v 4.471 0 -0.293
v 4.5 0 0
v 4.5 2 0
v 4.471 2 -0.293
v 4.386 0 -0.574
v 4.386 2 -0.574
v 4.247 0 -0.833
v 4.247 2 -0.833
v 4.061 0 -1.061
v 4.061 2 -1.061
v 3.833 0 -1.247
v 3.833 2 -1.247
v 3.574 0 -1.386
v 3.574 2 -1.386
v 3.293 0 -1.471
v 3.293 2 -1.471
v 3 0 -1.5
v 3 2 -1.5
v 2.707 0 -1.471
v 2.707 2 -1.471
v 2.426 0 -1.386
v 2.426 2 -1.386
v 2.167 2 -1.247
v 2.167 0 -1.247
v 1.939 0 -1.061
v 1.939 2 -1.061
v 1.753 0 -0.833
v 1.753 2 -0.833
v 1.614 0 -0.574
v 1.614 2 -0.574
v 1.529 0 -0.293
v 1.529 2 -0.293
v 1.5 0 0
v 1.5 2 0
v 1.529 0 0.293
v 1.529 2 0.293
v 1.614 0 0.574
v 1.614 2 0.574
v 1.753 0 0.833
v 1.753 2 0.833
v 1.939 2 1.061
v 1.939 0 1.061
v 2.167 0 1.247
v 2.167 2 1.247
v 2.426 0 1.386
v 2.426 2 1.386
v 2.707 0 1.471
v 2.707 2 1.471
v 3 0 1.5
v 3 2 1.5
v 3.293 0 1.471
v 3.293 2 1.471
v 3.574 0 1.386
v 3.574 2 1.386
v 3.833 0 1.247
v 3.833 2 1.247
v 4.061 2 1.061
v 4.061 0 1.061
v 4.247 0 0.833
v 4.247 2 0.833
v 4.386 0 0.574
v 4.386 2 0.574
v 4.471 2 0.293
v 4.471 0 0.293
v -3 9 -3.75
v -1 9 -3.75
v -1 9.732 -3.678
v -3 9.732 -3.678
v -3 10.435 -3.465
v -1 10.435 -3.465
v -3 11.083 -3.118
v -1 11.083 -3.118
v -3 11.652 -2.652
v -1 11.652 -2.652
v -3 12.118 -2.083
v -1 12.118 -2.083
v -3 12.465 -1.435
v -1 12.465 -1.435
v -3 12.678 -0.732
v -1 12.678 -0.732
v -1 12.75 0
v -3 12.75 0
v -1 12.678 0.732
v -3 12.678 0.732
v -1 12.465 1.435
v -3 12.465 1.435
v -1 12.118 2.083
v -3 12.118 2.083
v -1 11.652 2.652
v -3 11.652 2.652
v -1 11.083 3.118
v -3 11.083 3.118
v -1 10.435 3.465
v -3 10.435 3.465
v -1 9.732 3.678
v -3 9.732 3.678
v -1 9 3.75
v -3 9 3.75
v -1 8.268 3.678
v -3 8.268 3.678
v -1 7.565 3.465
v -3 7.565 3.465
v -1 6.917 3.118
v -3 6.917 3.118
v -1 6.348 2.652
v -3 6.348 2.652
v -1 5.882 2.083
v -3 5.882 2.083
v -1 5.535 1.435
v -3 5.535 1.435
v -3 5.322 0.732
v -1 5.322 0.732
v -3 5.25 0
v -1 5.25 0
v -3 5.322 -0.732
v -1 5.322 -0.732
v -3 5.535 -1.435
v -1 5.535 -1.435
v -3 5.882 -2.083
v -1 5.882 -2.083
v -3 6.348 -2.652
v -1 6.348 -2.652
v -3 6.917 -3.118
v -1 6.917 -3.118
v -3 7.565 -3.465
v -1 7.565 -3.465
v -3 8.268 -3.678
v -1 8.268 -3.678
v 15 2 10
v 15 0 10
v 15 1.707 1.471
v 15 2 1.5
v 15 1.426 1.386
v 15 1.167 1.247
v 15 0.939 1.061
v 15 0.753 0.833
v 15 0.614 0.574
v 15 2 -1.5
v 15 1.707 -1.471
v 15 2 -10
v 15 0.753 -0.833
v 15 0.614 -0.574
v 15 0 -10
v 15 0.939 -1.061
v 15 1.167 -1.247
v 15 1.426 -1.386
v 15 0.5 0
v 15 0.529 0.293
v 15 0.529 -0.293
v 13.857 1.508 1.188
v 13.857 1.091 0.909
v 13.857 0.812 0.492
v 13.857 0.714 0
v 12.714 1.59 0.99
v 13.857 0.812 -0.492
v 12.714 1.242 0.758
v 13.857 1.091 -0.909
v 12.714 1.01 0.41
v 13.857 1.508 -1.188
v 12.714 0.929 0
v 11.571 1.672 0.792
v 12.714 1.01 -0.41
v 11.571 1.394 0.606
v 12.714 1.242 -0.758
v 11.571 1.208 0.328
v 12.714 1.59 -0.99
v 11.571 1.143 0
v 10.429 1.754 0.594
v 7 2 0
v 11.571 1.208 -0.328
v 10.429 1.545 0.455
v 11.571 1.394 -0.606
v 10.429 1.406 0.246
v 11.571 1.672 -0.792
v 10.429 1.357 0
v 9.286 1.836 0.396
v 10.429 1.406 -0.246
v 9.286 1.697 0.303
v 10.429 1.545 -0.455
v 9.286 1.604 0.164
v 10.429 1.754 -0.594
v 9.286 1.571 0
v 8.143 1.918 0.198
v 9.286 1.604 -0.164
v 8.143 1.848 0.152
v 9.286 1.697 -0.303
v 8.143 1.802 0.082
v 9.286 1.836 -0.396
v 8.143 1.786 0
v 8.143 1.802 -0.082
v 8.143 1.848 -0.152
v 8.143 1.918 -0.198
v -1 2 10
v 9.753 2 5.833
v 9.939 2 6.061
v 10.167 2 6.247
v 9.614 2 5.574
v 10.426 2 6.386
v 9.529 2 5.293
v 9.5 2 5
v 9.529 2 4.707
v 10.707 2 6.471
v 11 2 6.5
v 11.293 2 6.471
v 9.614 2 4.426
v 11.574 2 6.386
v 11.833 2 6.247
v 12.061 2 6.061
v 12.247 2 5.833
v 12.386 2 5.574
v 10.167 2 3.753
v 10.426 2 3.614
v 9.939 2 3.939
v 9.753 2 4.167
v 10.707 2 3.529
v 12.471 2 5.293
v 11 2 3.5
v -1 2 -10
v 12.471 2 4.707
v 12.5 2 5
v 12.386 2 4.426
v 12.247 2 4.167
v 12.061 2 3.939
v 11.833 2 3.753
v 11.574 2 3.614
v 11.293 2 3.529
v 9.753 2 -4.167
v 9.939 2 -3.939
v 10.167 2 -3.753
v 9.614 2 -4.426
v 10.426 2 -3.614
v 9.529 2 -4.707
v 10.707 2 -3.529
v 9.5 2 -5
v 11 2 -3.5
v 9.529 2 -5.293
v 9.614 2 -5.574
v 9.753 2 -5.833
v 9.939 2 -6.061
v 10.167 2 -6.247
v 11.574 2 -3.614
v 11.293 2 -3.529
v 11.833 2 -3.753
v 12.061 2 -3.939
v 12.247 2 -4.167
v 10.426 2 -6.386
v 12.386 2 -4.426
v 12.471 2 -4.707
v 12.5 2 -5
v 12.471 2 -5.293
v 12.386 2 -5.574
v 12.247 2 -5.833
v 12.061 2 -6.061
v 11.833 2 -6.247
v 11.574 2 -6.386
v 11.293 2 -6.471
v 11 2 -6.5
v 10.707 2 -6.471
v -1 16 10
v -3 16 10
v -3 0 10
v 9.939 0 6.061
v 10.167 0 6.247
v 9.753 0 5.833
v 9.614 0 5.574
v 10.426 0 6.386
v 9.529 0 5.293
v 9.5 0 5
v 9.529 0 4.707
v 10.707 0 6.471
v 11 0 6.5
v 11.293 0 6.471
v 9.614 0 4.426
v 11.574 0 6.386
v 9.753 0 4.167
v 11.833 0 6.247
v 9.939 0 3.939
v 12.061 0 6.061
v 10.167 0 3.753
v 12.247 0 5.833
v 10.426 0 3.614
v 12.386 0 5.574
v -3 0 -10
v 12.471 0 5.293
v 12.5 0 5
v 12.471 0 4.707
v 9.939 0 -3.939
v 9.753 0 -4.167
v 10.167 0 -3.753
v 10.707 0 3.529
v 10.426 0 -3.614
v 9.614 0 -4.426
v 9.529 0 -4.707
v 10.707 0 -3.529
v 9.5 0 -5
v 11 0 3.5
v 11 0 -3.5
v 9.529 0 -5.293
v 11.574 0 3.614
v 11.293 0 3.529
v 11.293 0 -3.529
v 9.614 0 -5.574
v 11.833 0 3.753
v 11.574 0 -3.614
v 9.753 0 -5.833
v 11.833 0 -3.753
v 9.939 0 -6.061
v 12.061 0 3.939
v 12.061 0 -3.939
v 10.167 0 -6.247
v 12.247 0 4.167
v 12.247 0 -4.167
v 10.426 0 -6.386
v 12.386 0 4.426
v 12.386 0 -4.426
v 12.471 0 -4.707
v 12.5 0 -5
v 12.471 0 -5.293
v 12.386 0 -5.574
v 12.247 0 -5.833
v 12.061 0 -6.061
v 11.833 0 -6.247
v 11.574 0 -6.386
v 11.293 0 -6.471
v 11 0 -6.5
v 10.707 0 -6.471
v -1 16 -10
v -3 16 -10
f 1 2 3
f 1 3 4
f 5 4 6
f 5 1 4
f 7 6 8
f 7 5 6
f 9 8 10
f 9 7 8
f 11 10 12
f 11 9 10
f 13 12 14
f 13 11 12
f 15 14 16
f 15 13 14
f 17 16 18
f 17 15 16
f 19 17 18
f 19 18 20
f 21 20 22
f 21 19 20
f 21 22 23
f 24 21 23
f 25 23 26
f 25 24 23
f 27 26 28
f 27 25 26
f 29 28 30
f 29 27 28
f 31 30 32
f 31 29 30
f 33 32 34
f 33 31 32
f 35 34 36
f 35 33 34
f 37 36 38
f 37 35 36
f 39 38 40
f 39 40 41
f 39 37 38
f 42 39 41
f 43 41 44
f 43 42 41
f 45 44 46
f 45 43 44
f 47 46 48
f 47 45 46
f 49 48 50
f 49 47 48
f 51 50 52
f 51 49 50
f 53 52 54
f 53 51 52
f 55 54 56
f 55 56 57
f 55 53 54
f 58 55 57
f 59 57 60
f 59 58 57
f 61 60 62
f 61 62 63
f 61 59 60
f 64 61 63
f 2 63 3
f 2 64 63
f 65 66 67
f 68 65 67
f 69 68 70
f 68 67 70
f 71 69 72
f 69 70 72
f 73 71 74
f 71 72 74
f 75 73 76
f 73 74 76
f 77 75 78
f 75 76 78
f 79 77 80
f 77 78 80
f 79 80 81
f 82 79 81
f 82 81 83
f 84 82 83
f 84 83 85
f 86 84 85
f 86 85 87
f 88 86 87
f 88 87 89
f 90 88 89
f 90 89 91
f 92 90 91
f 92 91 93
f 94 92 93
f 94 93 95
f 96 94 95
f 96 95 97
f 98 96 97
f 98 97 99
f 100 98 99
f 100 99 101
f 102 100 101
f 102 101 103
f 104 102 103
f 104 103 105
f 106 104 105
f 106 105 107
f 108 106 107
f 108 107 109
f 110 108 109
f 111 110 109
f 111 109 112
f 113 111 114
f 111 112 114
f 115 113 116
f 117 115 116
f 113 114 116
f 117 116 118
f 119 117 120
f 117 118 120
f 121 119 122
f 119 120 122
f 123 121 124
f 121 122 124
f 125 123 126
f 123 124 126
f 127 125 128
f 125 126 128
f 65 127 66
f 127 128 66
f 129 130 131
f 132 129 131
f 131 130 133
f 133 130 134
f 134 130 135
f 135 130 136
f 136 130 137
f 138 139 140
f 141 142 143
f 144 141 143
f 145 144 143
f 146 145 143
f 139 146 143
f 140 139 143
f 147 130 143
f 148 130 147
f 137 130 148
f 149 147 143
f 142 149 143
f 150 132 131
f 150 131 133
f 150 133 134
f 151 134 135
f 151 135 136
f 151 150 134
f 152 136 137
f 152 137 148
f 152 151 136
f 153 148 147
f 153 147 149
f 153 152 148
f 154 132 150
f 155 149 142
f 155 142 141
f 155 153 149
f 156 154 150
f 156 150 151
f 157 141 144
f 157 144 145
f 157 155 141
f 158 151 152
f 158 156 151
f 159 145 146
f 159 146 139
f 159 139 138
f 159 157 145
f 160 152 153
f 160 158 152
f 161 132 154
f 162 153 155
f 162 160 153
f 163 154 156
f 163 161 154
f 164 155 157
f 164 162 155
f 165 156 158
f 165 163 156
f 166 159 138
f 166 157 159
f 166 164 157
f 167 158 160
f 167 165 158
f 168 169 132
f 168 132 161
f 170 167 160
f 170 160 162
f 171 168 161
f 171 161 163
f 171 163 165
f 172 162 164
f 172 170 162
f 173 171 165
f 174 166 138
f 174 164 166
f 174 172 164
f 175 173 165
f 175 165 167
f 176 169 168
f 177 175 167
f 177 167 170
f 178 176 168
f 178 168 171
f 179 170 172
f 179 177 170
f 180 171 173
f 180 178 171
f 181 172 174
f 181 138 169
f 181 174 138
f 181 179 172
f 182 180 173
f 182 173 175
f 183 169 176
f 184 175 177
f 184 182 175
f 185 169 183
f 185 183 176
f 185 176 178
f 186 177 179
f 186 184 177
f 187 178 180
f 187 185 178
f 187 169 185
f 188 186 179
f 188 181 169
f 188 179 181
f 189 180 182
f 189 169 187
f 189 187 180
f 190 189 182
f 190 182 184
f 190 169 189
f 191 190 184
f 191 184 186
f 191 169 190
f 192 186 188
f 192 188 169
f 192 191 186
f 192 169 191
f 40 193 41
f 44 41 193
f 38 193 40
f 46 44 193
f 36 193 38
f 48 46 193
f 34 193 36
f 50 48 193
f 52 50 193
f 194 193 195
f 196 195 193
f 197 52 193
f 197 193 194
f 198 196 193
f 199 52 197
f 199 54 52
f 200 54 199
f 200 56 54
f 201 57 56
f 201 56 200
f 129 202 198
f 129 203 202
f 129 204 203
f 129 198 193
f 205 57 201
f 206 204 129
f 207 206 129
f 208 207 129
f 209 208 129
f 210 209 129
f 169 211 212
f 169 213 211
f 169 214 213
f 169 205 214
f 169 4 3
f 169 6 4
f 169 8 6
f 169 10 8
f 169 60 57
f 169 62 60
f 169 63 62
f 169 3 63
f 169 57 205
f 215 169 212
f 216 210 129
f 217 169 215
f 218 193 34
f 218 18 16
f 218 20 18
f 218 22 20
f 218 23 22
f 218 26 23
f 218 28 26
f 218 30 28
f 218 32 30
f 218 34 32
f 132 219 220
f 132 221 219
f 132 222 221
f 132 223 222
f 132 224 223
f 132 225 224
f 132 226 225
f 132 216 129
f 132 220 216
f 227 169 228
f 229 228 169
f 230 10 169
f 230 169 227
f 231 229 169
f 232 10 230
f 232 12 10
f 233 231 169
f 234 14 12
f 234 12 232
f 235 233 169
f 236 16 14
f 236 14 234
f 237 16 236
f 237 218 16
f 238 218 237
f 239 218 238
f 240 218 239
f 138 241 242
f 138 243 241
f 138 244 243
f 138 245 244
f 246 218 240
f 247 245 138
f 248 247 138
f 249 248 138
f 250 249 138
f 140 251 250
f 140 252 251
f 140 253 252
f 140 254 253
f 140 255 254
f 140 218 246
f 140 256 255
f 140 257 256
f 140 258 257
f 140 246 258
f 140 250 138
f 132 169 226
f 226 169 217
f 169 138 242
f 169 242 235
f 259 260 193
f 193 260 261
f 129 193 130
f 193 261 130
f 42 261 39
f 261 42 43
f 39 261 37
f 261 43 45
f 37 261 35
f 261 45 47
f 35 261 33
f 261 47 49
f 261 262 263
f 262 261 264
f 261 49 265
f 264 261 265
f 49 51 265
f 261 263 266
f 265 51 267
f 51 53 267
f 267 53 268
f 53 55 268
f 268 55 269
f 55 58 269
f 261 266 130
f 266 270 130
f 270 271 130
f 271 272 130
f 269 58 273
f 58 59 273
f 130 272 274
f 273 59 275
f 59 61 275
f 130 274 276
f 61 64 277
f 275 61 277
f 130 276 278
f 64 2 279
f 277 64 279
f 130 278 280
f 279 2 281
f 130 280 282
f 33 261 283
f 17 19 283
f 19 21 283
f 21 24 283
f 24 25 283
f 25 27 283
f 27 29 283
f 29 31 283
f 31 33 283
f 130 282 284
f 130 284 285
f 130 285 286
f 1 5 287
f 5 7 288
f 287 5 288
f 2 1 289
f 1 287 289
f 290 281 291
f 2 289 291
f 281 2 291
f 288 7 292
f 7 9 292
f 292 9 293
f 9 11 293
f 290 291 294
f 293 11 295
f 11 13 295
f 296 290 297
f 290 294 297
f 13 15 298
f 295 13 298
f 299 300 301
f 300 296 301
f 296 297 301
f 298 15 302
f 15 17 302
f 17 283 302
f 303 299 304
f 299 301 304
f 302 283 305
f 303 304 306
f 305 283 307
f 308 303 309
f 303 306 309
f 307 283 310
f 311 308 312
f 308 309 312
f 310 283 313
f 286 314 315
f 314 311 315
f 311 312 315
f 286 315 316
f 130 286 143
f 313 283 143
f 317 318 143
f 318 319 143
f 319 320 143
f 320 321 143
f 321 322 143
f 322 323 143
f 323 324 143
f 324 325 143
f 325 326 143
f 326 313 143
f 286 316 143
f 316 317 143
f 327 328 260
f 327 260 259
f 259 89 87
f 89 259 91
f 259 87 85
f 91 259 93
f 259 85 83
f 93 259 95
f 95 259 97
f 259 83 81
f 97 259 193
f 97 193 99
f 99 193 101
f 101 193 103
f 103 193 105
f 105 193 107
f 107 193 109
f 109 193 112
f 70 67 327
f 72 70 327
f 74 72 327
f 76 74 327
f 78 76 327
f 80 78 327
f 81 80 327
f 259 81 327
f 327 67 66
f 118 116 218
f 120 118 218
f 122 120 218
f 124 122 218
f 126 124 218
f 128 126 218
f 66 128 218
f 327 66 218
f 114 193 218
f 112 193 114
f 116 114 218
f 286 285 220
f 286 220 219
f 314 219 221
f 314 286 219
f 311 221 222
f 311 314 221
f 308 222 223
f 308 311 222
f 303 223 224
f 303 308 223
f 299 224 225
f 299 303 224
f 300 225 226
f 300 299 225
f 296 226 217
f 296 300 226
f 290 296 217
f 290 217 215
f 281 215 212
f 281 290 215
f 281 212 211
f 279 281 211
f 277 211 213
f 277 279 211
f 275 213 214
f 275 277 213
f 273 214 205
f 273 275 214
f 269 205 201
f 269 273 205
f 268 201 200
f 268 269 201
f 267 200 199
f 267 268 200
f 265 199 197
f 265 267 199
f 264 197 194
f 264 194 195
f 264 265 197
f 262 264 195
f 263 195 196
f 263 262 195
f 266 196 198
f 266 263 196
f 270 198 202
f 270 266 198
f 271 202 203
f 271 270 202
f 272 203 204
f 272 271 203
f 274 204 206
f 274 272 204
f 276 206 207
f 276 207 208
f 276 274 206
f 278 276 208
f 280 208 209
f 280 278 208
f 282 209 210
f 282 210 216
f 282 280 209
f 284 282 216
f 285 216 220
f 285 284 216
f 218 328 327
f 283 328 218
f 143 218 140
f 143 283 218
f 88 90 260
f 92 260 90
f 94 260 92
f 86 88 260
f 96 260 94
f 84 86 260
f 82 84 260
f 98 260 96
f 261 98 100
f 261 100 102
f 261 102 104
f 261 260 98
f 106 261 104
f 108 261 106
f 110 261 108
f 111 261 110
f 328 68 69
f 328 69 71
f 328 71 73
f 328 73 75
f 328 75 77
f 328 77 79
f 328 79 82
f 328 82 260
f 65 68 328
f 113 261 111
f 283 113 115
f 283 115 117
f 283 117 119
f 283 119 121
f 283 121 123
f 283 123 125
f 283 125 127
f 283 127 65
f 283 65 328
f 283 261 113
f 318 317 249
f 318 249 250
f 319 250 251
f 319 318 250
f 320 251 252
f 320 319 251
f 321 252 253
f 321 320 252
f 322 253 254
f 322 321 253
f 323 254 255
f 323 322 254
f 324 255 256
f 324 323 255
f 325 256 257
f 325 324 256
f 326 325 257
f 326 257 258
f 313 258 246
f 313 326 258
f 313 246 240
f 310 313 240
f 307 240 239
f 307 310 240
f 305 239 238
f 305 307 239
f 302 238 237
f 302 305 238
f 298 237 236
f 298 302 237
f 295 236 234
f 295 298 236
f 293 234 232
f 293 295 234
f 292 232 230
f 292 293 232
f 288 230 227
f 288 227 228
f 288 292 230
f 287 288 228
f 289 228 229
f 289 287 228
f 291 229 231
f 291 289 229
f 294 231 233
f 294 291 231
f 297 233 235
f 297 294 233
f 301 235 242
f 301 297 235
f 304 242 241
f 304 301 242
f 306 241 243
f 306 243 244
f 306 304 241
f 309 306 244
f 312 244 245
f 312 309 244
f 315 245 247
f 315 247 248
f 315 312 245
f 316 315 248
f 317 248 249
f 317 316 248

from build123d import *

# Parameters (mm, degrees)
SKETCH_1_R          = 1.5
EXTRUDE_1_DEPTH     = 2
SKETCH_2_W          = 2
SKETCH_2_H          = 20
EXTRUDE_2_DEPTH     = 14
SKETCH_4_R          = 3.75
CUT_EXTRUDE_1_DEPTH = 10


with BuildPart() as part:
    # 草图1 → 凸台-拉伸1 (new body)
    with BuildSketch(Plane(origin=(0, 0, 0), x_dir=(1, 0, 0), z_dir=(0, 1, 0))):
        Polygon((-3, 0), (-3, -10), (15, -10), (15, 10), (-3, 10), align=None)
        with Locations((3, 0)):
            Circle(SKETCH_1_R, mode=Mode.SUBTRACT)
        with Locations((11, 5)):
            Circle(SKETCH_1_R, mode=Mode.SUBTRACT)
        with Locations((11, -5)):
            Circle(SKETCH_1_R, mode=Mode.SUBTRACT)
    extrude(amount=EXTRUDE_1_DEPTH)

    # 草图2 → 凸台-拉伸2 (add)
    with BuildSketch(Plane(origin=(0, 2, 0), x_dir=(1, 0, 0), z_dir=(0, 1, 0))):
        with Locations((-2, 0)):
            Rectangle(SKETCH_2_W, SKETCH_2_H)
    extrude(amount=EXTRUDE_2_DEPTH)

    # 草图4 → 切除-拉伸1 (cut)
    with BuildSketch(Plane(origin=(-1, 0, 0), x_dir=(0, 0, -1), z_dir=(1, 0, 0))):
        with Locations((0, 9)):
            Circle(SKETCH_4_R)
    extrude(amount=-CUT_EXTRUDE_1_DEPTH, mode=Mode.SUBTRACT)

    # 草图7 → 切除-旋转1 (revolve, cut)
    with BuildSketch(Plane(origin=(0, 2, 0), x_dir=(1, 0, 0), z_dir=(0, 1, 0))):
        Polygon((7, 0), (15, 0), (15, 1.5), align=None)
    revolve(axis=Axis((7, 2, 0), (1, 0, 0)), mode=Mode.SUBTRACT)


solid = part.part
